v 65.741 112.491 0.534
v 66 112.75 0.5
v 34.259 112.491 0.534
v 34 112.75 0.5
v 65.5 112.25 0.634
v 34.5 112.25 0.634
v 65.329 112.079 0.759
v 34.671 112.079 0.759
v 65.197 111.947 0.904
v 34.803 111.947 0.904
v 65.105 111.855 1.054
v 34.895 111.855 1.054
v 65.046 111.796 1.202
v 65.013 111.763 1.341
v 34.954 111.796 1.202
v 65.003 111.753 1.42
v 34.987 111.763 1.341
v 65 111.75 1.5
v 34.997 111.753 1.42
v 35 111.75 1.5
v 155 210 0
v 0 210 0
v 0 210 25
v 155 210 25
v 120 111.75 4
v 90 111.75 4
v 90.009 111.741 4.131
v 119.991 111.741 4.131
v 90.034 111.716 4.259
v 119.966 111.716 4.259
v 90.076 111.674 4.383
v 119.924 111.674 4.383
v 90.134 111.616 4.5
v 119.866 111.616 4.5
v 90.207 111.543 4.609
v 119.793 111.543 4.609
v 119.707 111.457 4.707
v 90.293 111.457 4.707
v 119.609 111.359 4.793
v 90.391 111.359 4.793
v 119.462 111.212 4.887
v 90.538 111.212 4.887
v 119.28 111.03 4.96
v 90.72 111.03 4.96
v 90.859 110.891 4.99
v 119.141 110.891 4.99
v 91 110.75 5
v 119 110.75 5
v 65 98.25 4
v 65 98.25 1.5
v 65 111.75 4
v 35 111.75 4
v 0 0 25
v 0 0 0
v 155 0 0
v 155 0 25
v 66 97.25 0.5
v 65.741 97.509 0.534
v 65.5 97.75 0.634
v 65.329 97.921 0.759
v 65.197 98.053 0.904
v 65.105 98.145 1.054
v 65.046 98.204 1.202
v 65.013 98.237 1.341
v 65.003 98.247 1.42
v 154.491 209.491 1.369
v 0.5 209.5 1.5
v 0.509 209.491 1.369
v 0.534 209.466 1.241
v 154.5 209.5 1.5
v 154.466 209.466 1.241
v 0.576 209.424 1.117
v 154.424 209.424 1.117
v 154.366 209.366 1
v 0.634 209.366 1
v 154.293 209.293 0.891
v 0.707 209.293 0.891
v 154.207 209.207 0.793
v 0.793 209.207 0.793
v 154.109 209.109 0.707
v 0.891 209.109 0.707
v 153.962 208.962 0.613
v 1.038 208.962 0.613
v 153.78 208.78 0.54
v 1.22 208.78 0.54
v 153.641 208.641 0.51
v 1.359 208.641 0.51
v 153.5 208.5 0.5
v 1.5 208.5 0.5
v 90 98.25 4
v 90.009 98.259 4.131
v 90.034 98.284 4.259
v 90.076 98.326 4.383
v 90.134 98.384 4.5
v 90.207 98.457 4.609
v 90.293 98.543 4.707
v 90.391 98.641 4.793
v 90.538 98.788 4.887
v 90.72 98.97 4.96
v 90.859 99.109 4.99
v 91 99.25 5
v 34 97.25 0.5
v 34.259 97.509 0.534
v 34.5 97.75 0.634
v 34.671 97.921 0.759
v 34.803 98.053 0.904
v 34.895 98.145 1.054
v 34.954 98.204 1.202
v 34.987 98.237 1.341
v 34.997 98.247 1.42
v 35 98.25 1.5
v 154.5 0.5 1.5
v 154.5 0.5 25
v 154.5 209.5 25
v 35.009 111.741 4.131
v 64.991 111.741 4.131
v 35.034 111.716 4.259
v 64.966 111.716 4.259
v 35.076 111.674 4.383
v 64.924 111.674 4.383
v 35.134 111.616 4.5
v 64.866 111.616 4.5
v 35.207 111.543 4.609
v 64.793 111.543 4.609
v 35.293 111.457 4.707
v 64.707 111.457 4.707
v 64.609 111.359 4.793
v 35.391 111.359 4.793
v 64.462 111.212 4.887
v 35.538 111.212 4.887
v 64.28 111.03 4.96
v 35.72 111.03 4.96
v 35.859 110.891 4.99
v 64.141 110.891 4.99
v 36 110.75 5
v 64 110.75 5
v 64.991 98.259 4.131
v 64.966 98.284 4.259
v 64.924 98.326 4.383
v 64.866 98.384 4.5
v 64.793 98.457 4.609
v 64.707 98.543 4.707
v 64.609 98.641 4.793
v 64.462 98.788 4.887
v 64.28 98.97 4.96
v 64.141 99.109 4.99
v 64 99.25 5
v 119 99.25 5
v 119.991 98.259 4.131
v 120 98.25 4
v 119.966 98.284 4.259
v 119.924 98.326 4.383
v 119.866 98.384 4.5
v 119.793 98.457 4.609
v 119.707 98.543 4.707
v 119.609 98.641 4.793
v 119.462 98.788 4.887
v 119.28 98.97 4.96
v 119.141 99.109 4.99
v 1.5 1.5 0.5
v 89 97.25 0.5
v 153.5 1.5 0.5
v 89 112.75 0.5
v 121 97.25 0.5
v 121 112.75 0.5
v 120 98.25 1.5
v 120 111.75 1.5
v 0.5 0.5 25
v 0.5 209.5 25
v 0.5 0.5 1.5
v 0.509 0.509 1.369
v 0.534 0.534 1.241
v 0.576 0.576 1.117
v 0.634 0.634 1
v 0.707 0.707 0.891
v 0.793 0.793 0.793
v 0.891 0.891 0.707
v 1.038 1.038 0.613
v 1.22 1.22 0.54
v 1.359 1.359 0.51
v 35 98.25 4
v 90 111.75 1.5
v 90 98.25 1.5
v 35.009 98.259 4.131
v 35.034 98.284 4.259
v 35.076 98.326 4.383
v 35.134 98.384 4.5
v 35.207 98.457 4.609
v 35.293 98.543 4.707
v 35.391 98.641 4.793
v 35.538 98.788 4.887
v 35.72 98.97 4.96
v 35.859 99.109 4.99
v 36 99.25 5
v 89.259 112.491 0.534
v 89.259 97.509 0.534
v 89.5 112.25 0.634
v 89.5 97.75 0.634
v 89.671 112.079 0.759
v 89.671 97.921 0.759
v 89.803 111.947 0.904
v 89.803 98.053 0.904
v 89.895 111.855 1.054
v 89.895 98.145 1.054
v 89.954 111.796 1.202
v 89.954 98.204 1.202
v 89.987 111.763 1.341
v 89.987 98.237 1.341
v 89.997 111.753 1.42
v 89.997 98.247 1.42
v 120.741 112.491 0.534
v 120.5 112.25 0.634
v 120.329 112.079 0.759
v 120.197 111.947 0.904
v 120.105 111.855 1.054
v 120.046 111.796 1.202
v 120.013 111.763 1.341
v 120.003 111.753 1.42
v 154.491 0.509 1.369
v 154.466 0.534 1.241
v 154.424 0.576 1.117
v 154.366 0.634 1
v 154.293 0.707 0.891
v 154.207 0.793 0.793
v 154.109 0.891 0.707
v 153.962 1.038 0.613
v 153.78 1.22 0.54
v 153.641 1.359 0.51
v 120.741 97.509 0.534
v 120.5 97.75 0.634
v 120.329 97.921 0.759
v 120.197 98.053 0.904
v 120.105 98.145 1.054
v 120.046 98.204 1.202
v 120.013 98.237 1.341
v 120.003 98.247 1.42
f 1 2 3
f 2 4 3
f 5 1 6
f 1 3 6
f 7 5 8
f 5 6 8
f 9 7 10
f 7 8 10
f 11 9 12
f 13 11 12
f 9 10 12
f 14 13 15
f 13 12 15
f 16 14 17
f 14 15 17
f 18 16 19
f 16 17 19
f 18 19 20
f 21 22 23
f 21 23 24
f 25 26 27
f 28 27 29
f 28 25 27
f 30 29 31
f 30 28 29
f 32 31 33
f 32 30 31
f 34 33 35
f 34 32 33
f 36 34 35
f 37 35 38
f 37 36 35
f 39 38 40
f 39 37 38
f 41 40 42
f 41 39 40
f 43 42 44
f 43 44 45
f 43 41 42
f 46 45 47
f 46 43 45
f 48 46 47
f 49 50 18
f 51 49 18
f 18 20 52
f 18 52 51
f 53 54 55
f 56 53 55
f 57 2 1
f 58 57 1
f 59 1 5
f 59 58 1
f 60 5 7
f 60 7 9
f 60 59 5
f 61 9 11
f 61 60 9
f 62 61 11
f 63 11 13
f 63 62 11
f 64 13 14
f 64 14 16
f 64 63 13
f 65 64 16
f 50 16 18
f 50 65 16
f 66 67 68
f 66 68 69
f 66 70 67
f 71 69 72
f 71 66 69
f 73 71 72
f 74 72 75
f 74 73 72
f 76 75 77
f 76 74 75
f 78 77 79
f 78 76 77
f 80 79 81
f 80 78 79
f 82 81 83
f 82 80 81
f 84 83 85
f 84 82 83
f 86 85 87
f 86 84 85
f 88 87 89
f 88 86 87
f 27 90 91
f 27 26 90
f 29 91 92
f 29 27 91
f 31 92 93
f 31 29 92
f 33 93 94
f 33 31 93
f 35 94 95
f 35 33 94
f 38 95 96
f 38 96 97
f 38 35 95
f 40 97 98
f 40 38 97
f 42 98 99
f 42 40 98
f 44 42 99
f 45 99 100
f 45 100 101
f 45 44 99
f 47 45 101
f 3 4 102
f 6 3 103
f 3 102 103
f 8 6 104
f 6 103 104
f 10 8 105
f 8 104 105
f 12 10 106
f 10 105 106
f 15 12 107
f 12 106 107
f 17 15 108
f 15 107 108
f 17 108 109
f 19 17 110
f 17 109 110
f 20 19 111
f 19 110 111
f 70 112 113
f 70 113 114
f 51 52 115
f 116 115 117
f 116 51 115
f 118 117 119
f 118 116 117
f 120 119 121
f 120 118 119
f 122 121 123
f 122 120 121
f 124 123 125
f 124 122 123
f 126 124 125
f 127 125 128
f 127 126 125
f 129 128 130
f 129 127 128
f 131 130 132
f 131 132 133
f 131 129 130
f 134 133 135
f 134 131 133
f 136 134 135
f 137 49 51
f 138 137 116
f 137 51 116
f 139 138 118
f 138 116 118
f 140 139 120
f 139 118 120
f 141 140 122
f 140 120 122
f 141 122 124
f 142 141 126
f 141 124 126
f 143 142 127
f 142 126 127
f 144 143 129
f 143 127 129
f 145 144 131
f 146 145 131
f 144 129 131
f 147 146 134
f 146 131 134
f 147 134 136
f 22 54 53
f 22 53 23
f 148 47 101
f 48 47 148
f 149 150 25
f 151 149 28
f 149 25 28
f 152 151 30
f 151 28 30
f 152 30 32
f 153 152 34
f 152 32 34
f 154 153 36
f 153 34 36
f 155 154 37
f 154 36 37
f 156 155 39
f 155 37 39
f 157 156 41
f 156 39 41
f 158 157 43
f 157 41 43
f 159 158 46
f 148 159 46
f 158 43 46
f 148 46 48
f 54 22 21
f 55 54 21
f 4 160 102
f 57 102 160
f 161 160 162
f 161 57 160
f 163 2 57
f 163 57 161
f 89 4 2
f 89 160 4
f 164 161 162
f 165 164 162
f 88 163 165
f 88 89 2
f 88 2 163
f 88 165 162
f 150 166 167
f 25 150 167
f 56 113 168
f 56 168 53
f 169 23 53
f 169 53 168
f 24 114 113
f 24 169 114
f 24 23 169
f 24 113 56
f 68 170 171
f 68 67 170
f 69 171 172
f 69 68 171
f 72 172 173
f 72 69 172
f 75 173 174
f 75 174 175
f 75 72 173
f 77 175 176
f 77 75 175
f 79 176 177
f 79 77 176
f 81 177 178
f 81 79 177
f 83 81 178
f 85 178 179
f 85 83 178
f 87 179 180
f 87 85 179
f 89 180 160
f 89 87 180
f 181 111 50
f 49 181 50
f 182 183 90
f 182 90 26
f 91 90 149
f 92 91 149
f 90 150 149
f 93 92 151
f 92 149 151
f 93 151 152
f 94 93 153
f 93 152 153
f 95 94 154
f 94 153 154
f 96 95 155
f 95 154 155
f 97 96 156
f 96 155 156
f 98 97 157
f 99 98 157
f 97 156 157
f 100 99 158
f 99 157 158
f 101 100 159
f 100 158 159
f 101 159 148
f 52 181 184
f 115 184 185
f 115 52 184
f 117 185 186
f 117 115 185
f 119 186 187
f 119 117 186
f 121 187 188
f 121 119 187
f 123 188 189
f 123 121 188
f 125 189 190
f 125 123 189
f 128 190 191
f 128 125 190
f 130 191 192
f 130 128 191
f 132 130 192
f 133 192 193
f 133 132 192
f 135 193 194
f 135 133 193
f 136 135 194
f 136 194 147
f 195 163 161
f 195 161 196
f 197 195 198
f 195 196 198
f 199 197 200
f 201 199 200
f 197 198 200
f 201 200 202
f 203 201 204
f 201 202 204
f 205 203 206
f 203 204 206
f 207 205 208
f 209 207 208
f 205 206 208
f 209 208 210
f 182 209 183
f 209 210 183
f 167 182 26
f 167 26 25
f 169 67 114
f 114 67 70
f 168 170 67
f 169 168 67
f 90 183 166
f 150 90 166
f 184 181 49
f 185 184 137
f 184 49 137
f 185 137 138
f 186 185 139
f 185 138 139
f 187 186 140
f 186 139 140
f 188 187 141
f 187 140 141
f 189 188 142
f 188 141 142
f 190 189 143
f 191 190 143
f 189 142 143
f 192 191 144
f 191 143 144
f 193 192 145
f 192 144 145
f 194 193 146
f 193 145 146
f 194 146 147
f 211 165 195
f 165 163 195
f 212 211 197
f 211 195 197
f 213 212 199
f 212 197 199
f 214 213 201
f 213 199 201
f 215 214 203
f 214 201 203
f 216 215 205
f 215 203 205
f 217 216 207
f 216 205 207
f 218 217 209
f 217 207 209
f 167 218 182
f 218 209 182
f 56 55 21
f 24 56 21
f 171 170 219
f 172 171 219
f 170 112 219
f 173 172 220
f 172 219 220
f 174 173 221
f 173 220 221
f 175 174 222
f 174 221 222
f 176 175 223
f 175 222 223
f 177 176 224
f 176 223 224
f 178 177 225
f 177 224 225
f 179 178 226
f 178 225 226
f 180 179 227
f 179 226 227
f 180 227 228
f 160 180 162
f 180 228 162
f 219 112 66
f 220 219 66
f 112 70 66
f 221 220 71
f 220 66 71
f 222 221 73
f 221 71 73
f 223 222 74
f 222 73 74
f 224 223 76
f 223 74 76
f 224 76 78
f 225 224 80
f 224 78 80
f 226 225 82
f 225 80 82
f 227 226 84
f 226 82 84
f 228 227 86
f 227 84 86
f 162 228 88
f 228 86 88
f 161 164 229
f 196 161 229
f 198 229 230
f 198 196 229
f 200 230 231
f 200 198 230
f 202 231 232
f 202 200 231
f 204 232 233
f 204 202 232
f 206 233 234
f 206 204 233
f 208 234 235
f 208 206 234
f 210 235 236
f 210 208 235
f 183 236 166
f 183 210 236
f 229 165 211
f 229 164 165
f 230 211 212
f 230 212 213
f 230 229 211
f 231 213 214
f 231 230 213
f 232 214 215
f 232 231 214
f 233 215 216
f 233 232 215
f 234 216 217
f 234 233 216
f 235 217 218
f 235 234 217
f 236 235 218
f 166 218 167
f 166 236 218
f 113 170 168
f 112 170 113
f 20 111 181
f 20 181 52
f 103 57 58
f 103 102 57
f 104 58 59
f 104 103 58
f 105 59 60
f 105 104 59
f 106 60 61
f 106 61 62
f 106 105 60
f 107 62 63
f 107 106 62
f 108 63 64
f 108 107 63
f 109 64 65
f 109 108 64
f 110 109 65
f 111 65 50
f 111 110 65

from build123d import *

# Parameters (mm, degrees)
SKETCH001_W  = 155
SKETCH001_H  = 210
PAD_DEPTH    = 25
THICKNESS_T  = -0.5
SKETCH_W     = 30
SKETCH_H     = 13.5
PAD001_DEPTH = 5
FILLET_R     = 1
FILLET001_R  = 1


with BuildPart() as part:
    # Sketch001 → Pad (new body)
    with BuildSketch(Plane.XY):
        with Locations((77.5, 105)):
            Rectangle(SKETCH001_W, SKETCH001_H)
    extrude(amount=PAD_DEPTH)

    # Thickness
    thickness_openings = [part.faces().sort_by_distance(p)[0] for p in [
        (77.5, 105, 25),
    ]]
    offset(amount=THICKNESS_T, openings=thickness_openings)

    # Sketch → Pad001 (join)
    with BuildSketch(Plane.XY):
        with Locations((50, 105)):
            Rectangle(SKETCH_W, SKETCH_H)
        with Locations((105, 105)):
            Rectangle(SKETCH_W, SKETCH_H)
    extrude(amount=PAD001_DEPTH)

    # Fillet
    fillet_edges = [part.edges().sort_by_distance(p)[0] for p in [
        (77.5, 0.5, 0.5),
        (0.5, 105, 0.5),
        (154.5, 105, 0.5),
        (77.5, 209.5, 0.5),
        (50, 98.25, 0.5),
        (65, 105, 0.5),
        (50, 111.75, 0.5),
        (35, 105, 0.5),
        (120, 105, 0.5),
        (105, 111.75, 0.5),
        (90, 105, 0.5),
        (105, 98.25, 0.5),
    ]]
    fillet(fillet_edges, radius=FILLET_R)

    # Fillet001
    fillet001_edges = [part.edges().sort_by_distance(p)[0] for p in [
        (35, 105, 5),
        (50, 98.25, 5),
        (65, 105, 5),
        (50, 111.75, 5),
        (120, 105, 5),
        (105, 98.25, 5),
        (90, 105, 5),
        (105, 111.75, 5),
    ]]
    fillet(fillet001_edges, radius=FILLET001_R)


solid = part.part
